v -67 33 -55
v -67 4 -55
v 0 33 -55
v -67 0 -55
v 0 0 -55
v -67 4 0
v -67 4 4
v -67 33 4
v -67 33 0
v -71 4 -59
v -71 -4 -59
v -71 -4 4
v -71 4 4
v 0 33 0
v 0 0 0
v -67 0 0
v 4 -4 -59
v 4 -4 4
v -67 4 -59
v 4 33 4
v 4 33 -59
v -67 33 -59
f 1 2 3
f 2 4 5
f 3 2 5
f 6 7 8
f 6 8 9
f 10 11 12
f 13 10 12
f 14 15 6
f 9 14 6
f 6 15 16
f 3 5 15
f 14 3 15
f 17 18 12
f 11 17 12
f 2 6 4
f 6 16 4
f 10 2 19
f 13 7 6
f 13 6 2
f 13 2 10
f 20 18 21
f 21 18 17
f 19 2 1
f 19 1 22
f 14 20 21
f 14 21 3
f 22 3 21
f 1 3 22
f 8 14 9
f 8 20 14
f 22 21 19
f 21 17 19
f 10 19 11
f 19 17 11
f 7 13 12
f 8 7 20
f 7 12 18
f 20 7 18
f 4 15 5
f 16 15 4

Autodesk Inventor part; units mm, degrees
ref_plane "YZ Plane" through (0, 0, 0) normal (1, 0, 0) x (0, 1, 0)
ref_plane "XZ Plane" through (0, 0, 0) normal (0, 1, 0) x (-1, 0, 0)
ref_plane "XY Plane" through (0, 0, 0) normal (0, 0, 1) x (1, 0, 0)
sketch "Sketch1" plane through (0, 0, 0) normal (0, 1, 0) x (-1, 0, 0)
  line L0 (0, 0) -> (67, 0)
  line L1 (67, 0) -> (67, -55)
  line L2 (67, -55) -> (0, -55)
  line L3 (0, -55) -> (0, 0)
  line L4 (-4, -59) -> (71, -59)
  line L5 (71, -59) -> (71, 4)
  line L6 (71, 4) -> (-4, 4)
  line L7 (-4, 4) -> (-4, -59)
  line L8 (67, 4) -> (67, -59)
  dimension "d0" = 67
  dimension "d1" = 55
  dimension "d2" = 4
extrude "Extrusion1" add sketch "Sketch1" along normal blind 33 contours L3 L2 L8 L4 L7 L6 L0
extrude "Extrusion2" add sketch "Sketch1" against normal blind 4
extrude "Extrusion3" add sketch "Sketch1" along normal blind 4 contours L8 L6 L5 L4 L1
properties part number "Z Fold Jig"
